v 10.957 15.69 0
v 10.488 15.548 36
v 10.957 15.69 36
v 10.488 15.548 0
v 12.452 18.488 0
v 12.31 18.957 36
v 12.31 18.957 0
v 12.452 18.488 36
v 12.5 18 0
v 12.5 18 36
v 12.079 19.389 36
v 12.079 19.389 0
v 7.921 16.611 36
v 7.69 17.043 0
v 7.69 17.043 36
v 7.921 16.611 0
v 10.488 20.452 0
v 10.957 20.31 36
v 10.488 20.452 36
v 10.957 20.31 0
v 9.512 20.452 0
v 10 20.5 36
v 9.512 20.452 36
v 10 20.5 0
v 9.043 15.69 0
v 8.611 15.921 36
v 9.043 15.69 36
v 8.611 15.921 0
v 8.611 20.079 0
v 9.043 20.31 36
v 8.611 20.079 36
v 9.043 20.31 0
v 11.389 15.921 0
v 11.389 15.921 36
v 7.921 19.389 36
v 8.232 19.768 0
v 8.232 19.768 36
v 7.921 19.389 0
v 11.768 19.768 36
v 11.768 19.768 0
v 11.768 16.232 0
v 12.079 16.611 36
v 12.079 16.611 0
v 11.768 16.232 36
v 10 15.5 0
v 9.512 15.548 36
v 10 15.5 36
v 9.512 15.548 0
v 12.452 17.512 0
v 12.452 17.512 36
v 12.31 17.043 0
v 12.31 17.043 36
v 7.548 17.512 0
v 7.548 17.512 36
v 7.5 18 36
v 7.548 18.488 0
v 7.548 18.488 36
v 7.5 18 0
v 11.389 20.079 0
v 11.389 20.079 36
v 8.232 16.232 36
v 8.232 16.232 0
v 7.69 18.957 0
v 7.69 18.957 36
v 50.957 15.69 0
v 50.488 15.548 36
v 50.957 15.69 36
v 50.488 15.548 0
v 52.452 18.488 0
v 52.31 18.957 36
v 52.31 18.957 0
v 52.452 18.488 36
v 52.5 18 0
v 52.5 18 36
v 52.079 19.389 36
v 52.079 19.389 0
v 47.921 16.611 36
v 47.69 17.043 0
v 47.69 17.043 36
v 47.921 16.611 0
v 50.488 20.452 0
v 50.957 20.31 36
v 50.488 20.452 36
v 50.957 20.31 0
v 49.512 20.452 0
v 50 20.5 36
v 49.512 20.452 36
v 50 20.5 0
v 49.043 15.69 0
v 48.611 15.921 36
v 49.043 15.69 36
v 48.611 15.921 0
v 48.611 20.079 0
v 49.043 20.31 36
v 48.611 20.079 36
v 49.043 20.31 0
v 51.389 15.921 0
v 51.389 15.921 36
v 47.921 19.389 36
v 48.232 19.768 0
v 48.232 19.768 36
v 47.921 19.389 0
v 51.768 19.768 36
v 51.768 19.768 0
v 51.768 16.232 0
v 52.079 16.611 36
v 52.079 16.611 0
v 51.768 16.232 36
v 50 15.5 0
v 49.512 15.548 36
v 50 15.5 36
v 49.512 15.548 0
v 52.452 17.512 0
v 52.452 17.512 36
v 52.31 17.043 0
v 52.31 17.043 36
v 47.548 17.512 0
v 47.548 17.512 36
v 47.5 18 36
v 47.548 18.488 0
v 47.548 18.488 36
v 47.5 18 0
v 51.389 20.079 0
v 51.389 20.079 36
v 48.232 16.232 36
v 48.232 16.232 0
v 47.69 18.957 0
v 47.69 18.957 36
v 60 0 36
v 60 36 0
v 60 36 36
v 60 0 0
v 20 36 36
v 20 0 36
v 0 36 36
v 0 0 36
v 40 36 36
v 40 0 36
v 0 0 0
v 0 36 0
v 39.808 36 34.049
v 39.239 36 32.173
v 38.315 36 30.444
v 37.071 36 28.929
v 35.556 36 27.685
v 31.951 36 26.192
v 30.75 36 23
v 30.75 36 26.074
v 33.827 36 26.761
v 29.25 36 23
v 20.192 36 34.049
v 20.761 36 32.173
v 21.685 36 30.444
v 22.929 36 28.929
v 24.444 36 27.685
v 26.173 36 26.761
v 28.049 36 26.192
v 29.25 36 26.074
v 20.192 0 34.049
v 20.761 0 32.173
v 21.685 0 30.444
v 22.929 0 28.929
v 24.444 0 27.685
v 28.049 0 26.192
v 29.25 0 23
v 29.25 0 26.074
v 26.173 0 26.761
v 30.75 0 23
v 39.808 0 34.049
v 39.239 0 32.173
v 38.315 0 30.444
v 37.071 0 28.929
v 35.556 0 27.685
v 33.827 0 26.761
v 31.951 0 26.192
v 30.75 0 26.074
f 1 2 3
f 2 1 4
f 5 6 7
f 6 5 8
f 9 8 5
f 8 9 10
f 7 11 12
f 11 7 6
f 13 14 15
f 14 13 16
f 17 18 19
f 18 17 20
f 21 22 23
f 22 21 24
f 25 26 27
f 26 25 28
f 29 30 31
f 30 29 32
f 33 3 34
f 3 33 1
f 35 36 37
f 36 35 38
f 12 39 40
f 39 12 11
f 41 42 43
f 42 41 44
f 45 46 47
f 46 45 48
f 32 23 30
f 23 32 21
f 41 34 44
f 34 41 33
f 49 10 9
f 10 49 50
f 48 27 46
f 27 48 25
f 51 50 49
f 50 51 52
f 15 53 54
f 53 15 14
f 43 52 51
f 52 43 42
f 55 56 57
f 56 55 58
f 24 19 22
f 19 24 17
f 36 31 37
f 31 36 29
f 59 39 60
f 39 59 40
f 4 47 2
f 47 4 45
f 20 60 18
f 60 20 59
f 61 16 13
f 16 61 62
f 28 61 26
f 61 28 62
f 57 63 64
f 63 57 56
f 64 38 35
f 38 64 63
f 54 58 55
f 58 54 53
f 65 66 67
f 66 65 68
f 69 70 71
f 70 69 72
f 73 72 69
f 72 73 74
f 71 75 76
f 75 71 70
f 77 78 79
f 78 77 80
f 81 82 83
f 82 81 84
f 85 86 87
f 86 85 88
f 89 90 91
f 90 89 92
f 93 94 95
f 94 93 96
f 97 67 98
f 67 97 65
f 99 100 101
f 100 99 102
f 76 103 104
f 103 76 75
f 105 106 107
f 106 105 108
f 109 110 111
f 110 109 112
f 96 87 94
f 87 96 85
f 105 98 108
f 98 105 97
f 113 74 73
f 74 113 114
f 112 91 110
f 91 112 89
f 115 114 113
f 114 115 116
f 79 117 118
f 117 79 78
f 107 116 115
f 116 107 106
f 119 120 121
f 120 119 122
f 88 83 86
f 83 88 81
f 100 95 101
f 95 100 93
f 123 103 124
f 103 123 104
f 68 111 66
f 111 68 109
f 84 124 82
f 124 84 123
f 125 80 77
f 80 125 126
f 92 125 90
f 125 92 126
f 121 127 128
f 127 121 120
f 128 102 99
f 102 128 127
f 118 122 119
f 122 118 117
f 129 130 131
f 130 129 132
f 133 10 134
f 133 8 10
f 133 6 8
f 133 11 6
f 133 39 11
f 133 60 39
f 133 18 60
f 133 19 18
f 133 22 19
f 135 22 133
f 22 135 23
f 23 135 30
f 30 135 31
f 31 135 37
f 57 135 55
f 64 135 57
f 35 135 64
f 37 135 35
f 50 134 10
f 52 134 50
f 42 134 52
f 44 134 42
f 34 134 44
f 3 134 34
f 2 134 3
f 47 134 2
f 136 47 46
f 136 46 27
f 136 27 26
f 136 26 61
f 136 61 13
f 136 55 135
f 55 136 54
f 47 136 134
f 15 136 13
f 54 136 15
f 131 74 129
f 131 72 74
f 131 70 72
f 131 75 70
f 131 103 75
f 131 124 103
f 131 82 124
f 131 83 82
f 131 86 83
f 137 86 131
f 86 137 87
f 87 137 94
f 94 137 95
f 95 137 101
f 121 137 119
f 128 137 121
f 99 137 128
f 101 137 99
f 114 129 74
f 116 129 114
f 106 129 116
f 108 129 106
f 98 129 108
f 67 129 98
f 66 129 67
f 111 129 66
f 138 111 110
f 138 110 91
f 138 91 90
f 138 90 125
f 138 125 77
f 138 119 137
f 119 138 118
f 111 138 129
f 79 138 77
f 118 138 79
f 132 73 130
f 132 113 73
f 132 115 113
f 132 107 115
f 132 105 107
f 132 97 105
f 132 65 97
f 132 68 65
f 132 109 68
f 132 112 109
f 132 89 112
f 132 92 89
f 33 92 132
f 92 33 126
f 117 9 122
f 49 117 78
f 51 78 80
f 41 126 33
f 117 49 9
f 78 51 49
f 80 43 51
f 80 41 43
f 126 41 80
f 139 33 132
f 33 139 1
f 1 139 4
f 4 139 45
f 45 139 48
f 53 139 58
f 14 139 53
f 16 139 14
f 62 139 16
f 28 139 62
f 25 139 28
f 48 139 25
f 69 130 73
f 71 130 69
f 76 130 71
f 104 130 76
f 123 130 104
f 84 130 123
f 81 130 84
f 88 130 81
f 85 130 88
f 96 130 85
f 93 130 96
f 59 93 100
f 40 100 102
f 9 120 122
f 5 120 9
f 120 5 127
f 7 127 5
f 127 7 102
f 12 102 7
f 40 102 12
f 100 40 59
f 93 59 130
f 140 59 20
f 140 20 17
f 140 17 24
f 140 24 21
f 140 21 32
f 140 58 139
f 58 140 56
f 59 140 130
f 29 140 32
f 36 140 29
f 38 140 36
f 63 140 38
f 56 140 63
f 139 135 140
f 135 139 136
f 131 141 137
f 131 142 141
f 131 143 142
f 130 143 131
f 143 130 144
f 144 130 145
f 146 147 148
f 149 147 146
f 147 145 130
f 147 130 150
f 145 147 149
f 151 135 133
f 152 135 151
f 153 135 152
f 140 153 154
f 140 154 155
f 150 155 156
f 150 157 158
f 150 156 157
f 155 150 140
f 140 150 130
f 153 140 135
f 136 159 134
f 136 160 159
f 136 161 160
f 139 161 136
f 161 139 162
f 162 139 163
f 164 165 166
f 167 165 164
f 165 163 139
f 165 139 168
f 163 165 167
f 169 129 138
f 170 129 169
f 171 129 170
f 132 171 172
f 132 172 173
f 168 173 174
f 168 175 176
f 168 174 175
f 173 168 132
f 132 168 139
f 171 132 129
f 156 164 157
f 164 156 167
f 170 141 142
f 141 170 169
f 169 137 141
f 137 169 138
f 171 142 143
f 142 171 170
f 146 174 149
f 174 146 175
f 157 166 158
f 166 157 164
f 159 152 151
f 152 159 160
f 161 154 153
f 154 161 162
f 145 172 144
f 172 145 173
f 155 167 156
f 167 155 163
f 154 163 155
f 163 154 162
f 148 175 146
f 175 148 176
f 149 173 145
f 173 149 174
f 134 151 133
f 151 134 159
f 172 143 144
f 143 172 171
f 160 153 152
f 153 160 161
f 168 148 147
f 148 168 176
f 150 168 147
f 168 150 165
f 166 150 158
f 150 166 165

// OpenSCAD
$fn = 32;

// ----------------------------------------------------------------------
// Saddle clamp: split shaft clamp
// ----------------------------------------------------------------------

// --- parameters (mm) ---
blk_l = 60;               // block length, X
blk_w = 36;               // block width, Y
blk_h = 36;               // block height
clamp_r = 10;             // shaft groove radius
hole_r = 2.5;             // bolt hole radius
hole_m = 10;              // bolt hole margin from the ends
saw_w = 1.5;              // saw kerf width
fit_tol = 0.05;           // tolerance for press fits, mm
free_tol = 0.3;           // tolerance for clearance fits, mm

saw_depth = clamp_r + 3;  // saw kerf depth

difference() {
  cube([blk_l, blk_w, blk_h]);
  translate([blk_l / 2, -1, blk_h])
    rotate([-90, 0, 0])
      cylinder(h = blk_w + 2, r = clamp_r);
  for (sx = [0, 1])
    translate([sx ? blk_l - hole_m : hole_m, blk_w / 2, -1])
      cylinder(r = hole_r, h = blk_h + 2);
  translate([blk_l / 2 - saw_w / 2, -1, blk_h - saw_depth])
    cube([saw_w, blk_w + 2, saw_depth + 1]);
}
